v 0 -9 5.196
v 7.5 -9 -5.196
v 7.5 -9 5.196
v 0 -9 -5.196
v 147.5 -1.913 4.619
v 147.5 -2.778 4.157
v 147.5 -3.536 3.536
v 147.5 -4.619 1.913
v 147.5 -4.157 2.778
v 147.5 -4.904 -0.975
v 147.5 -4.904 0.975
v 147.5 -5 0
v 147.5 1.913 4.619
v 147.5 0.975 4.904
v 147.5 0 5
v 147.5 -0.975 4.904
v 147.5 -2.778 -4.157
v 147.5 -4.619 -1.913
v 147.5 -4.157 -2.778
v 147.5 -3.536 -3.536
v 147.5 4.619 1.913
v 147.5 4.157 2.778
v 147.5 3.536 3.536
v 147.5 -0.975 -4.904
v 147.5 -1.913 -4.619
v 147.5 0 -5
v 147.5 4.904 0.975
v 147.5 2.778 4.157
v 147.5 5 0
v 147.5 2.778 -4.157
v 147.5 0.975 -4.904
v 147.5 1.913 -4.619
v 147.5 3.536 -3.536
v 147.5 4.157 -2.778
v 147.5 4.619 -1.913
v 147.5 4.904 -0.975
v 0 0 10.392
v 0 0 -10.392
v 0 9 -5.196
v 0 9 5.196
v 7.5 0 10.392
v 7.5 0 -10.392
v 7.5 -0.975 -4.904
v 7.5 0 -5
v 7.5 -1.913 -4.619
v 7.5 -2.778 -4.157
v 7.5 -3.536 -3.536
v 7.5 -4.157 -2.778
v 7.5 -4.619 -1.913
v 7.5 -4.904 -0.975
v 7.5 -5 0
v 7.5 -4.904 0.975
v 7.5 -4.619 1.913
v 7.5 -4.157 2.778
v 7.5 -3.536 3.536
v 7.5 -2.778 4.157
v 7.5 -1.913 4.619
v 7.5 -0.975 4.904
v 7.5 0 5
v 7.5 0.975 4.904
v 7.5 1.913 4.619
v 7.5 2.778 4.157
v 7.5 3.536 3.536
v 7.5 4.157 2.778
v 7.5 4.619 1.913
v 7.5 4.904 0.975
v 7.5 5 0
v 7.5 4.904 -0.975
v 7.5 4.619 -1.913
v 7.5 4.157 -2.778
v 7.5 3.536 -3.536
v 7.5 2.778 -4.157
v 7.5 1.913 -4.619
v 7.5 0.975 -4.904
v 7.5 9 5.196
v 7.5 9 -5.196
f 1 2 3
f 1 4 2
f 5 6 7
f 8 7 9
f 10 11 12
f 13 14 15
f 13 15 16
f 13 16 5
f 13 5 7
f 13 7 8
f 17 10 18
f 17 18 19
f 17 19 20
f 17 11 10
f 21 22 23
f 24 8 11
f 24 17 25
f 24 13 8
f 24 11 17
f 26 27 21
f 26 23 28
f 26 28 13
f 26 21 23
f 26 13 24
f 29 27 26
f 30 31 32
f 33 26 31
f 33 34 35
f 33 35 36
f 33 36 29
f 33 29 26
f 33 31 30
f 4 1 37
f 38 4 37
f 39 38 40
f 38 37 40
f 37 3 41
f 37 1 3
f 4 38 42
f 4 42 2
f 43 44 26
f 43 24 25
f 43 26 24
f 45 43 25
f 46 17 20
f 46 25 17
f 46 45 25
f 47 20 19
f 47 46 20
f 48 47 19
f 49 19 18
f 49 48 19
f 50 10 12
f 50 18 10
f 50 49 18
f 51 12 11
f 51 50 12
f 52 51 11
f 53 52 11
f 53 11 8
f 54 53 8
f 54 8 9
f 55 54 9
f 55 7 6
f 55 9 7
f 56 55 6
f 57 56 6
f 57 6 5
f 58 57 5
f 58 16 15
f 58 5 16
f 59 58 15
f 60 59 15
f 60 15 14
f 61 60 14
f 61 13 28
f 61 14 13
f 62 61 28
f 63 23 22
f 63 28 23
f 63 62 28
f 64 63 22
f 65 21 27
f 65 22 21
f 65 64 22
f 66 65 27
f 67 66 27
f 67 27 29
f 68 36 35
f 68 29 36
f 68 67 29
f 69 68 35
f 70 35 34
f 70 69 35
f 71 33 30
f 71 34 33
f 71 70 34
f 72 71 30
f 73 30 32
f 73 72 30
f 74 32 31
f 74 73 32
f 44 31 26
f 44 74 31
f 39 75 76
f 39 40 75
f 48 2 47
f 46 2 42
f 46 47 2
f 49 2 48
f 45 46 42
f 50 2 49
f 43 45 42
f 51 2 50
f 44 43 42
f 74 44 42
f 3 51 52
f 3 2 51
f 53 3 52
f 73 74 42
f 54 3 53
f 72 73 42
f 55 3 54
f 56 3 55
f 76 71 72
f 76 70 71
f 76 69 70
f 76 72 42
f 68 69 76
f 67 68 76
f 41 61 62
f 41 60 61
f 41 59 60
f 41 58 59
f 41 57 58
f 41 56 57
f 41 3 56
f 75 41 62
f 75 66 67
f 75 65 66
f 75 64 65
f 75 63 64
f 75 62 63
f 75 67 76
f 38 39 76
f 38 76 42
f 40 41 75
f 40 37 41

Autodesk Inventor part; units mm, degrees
ref_plane "YZ Plane" through (0, 0, 0) normal (1, 0, 0) x (0, 1, 0)
ref_plane "XZ Plane" through (0, 0, 0) normal (0, 1, 0) x (-1, 0, 0)
ref_plane "XY Plane" through (0, 0, 0) normal (0, 0, 1) x (1, 0, 0)
sketch "Náčrt1" plane through (0, 0, 0) normal (1, 0, 0) x (0, 1, 0)
  line L0 (0, -10.3923) -> (-9, -5.1962)
  line L1 (-9, -5.1962) -> (-9, 5.1962)
  line L2 (-9, 5.1962) -> (0, 10.3923)
  line L3 (0, 10.3923) -> (9, 5.1962)
  line L4 (9, 5.1962) -> (9, -5.1962)
  line L5 (9, -5.1962) -> (0, -10.3923)
  point P0 (0, 0)
  point P1 (0, 0)
  dimension "d0" = 18
extrude "Vysunutí1" add sketch "Náčrt1" along normal blind 7.5
sketch "Náčrt2" plane through (7.5, 0, 0) normal (1, 0, 0) x (0, 0, -1)
  circle A0 centre (0, 0) radius 5
  dimension "d3" = 10
extrude "Vysunutí2" add sketch "Náčrt2" along normal blind 140
thread "Závit1" size "M12x1.75" class "6g" standard "ANSI Metric M Profile" full length
properties part number "Šrouv M12x160"
